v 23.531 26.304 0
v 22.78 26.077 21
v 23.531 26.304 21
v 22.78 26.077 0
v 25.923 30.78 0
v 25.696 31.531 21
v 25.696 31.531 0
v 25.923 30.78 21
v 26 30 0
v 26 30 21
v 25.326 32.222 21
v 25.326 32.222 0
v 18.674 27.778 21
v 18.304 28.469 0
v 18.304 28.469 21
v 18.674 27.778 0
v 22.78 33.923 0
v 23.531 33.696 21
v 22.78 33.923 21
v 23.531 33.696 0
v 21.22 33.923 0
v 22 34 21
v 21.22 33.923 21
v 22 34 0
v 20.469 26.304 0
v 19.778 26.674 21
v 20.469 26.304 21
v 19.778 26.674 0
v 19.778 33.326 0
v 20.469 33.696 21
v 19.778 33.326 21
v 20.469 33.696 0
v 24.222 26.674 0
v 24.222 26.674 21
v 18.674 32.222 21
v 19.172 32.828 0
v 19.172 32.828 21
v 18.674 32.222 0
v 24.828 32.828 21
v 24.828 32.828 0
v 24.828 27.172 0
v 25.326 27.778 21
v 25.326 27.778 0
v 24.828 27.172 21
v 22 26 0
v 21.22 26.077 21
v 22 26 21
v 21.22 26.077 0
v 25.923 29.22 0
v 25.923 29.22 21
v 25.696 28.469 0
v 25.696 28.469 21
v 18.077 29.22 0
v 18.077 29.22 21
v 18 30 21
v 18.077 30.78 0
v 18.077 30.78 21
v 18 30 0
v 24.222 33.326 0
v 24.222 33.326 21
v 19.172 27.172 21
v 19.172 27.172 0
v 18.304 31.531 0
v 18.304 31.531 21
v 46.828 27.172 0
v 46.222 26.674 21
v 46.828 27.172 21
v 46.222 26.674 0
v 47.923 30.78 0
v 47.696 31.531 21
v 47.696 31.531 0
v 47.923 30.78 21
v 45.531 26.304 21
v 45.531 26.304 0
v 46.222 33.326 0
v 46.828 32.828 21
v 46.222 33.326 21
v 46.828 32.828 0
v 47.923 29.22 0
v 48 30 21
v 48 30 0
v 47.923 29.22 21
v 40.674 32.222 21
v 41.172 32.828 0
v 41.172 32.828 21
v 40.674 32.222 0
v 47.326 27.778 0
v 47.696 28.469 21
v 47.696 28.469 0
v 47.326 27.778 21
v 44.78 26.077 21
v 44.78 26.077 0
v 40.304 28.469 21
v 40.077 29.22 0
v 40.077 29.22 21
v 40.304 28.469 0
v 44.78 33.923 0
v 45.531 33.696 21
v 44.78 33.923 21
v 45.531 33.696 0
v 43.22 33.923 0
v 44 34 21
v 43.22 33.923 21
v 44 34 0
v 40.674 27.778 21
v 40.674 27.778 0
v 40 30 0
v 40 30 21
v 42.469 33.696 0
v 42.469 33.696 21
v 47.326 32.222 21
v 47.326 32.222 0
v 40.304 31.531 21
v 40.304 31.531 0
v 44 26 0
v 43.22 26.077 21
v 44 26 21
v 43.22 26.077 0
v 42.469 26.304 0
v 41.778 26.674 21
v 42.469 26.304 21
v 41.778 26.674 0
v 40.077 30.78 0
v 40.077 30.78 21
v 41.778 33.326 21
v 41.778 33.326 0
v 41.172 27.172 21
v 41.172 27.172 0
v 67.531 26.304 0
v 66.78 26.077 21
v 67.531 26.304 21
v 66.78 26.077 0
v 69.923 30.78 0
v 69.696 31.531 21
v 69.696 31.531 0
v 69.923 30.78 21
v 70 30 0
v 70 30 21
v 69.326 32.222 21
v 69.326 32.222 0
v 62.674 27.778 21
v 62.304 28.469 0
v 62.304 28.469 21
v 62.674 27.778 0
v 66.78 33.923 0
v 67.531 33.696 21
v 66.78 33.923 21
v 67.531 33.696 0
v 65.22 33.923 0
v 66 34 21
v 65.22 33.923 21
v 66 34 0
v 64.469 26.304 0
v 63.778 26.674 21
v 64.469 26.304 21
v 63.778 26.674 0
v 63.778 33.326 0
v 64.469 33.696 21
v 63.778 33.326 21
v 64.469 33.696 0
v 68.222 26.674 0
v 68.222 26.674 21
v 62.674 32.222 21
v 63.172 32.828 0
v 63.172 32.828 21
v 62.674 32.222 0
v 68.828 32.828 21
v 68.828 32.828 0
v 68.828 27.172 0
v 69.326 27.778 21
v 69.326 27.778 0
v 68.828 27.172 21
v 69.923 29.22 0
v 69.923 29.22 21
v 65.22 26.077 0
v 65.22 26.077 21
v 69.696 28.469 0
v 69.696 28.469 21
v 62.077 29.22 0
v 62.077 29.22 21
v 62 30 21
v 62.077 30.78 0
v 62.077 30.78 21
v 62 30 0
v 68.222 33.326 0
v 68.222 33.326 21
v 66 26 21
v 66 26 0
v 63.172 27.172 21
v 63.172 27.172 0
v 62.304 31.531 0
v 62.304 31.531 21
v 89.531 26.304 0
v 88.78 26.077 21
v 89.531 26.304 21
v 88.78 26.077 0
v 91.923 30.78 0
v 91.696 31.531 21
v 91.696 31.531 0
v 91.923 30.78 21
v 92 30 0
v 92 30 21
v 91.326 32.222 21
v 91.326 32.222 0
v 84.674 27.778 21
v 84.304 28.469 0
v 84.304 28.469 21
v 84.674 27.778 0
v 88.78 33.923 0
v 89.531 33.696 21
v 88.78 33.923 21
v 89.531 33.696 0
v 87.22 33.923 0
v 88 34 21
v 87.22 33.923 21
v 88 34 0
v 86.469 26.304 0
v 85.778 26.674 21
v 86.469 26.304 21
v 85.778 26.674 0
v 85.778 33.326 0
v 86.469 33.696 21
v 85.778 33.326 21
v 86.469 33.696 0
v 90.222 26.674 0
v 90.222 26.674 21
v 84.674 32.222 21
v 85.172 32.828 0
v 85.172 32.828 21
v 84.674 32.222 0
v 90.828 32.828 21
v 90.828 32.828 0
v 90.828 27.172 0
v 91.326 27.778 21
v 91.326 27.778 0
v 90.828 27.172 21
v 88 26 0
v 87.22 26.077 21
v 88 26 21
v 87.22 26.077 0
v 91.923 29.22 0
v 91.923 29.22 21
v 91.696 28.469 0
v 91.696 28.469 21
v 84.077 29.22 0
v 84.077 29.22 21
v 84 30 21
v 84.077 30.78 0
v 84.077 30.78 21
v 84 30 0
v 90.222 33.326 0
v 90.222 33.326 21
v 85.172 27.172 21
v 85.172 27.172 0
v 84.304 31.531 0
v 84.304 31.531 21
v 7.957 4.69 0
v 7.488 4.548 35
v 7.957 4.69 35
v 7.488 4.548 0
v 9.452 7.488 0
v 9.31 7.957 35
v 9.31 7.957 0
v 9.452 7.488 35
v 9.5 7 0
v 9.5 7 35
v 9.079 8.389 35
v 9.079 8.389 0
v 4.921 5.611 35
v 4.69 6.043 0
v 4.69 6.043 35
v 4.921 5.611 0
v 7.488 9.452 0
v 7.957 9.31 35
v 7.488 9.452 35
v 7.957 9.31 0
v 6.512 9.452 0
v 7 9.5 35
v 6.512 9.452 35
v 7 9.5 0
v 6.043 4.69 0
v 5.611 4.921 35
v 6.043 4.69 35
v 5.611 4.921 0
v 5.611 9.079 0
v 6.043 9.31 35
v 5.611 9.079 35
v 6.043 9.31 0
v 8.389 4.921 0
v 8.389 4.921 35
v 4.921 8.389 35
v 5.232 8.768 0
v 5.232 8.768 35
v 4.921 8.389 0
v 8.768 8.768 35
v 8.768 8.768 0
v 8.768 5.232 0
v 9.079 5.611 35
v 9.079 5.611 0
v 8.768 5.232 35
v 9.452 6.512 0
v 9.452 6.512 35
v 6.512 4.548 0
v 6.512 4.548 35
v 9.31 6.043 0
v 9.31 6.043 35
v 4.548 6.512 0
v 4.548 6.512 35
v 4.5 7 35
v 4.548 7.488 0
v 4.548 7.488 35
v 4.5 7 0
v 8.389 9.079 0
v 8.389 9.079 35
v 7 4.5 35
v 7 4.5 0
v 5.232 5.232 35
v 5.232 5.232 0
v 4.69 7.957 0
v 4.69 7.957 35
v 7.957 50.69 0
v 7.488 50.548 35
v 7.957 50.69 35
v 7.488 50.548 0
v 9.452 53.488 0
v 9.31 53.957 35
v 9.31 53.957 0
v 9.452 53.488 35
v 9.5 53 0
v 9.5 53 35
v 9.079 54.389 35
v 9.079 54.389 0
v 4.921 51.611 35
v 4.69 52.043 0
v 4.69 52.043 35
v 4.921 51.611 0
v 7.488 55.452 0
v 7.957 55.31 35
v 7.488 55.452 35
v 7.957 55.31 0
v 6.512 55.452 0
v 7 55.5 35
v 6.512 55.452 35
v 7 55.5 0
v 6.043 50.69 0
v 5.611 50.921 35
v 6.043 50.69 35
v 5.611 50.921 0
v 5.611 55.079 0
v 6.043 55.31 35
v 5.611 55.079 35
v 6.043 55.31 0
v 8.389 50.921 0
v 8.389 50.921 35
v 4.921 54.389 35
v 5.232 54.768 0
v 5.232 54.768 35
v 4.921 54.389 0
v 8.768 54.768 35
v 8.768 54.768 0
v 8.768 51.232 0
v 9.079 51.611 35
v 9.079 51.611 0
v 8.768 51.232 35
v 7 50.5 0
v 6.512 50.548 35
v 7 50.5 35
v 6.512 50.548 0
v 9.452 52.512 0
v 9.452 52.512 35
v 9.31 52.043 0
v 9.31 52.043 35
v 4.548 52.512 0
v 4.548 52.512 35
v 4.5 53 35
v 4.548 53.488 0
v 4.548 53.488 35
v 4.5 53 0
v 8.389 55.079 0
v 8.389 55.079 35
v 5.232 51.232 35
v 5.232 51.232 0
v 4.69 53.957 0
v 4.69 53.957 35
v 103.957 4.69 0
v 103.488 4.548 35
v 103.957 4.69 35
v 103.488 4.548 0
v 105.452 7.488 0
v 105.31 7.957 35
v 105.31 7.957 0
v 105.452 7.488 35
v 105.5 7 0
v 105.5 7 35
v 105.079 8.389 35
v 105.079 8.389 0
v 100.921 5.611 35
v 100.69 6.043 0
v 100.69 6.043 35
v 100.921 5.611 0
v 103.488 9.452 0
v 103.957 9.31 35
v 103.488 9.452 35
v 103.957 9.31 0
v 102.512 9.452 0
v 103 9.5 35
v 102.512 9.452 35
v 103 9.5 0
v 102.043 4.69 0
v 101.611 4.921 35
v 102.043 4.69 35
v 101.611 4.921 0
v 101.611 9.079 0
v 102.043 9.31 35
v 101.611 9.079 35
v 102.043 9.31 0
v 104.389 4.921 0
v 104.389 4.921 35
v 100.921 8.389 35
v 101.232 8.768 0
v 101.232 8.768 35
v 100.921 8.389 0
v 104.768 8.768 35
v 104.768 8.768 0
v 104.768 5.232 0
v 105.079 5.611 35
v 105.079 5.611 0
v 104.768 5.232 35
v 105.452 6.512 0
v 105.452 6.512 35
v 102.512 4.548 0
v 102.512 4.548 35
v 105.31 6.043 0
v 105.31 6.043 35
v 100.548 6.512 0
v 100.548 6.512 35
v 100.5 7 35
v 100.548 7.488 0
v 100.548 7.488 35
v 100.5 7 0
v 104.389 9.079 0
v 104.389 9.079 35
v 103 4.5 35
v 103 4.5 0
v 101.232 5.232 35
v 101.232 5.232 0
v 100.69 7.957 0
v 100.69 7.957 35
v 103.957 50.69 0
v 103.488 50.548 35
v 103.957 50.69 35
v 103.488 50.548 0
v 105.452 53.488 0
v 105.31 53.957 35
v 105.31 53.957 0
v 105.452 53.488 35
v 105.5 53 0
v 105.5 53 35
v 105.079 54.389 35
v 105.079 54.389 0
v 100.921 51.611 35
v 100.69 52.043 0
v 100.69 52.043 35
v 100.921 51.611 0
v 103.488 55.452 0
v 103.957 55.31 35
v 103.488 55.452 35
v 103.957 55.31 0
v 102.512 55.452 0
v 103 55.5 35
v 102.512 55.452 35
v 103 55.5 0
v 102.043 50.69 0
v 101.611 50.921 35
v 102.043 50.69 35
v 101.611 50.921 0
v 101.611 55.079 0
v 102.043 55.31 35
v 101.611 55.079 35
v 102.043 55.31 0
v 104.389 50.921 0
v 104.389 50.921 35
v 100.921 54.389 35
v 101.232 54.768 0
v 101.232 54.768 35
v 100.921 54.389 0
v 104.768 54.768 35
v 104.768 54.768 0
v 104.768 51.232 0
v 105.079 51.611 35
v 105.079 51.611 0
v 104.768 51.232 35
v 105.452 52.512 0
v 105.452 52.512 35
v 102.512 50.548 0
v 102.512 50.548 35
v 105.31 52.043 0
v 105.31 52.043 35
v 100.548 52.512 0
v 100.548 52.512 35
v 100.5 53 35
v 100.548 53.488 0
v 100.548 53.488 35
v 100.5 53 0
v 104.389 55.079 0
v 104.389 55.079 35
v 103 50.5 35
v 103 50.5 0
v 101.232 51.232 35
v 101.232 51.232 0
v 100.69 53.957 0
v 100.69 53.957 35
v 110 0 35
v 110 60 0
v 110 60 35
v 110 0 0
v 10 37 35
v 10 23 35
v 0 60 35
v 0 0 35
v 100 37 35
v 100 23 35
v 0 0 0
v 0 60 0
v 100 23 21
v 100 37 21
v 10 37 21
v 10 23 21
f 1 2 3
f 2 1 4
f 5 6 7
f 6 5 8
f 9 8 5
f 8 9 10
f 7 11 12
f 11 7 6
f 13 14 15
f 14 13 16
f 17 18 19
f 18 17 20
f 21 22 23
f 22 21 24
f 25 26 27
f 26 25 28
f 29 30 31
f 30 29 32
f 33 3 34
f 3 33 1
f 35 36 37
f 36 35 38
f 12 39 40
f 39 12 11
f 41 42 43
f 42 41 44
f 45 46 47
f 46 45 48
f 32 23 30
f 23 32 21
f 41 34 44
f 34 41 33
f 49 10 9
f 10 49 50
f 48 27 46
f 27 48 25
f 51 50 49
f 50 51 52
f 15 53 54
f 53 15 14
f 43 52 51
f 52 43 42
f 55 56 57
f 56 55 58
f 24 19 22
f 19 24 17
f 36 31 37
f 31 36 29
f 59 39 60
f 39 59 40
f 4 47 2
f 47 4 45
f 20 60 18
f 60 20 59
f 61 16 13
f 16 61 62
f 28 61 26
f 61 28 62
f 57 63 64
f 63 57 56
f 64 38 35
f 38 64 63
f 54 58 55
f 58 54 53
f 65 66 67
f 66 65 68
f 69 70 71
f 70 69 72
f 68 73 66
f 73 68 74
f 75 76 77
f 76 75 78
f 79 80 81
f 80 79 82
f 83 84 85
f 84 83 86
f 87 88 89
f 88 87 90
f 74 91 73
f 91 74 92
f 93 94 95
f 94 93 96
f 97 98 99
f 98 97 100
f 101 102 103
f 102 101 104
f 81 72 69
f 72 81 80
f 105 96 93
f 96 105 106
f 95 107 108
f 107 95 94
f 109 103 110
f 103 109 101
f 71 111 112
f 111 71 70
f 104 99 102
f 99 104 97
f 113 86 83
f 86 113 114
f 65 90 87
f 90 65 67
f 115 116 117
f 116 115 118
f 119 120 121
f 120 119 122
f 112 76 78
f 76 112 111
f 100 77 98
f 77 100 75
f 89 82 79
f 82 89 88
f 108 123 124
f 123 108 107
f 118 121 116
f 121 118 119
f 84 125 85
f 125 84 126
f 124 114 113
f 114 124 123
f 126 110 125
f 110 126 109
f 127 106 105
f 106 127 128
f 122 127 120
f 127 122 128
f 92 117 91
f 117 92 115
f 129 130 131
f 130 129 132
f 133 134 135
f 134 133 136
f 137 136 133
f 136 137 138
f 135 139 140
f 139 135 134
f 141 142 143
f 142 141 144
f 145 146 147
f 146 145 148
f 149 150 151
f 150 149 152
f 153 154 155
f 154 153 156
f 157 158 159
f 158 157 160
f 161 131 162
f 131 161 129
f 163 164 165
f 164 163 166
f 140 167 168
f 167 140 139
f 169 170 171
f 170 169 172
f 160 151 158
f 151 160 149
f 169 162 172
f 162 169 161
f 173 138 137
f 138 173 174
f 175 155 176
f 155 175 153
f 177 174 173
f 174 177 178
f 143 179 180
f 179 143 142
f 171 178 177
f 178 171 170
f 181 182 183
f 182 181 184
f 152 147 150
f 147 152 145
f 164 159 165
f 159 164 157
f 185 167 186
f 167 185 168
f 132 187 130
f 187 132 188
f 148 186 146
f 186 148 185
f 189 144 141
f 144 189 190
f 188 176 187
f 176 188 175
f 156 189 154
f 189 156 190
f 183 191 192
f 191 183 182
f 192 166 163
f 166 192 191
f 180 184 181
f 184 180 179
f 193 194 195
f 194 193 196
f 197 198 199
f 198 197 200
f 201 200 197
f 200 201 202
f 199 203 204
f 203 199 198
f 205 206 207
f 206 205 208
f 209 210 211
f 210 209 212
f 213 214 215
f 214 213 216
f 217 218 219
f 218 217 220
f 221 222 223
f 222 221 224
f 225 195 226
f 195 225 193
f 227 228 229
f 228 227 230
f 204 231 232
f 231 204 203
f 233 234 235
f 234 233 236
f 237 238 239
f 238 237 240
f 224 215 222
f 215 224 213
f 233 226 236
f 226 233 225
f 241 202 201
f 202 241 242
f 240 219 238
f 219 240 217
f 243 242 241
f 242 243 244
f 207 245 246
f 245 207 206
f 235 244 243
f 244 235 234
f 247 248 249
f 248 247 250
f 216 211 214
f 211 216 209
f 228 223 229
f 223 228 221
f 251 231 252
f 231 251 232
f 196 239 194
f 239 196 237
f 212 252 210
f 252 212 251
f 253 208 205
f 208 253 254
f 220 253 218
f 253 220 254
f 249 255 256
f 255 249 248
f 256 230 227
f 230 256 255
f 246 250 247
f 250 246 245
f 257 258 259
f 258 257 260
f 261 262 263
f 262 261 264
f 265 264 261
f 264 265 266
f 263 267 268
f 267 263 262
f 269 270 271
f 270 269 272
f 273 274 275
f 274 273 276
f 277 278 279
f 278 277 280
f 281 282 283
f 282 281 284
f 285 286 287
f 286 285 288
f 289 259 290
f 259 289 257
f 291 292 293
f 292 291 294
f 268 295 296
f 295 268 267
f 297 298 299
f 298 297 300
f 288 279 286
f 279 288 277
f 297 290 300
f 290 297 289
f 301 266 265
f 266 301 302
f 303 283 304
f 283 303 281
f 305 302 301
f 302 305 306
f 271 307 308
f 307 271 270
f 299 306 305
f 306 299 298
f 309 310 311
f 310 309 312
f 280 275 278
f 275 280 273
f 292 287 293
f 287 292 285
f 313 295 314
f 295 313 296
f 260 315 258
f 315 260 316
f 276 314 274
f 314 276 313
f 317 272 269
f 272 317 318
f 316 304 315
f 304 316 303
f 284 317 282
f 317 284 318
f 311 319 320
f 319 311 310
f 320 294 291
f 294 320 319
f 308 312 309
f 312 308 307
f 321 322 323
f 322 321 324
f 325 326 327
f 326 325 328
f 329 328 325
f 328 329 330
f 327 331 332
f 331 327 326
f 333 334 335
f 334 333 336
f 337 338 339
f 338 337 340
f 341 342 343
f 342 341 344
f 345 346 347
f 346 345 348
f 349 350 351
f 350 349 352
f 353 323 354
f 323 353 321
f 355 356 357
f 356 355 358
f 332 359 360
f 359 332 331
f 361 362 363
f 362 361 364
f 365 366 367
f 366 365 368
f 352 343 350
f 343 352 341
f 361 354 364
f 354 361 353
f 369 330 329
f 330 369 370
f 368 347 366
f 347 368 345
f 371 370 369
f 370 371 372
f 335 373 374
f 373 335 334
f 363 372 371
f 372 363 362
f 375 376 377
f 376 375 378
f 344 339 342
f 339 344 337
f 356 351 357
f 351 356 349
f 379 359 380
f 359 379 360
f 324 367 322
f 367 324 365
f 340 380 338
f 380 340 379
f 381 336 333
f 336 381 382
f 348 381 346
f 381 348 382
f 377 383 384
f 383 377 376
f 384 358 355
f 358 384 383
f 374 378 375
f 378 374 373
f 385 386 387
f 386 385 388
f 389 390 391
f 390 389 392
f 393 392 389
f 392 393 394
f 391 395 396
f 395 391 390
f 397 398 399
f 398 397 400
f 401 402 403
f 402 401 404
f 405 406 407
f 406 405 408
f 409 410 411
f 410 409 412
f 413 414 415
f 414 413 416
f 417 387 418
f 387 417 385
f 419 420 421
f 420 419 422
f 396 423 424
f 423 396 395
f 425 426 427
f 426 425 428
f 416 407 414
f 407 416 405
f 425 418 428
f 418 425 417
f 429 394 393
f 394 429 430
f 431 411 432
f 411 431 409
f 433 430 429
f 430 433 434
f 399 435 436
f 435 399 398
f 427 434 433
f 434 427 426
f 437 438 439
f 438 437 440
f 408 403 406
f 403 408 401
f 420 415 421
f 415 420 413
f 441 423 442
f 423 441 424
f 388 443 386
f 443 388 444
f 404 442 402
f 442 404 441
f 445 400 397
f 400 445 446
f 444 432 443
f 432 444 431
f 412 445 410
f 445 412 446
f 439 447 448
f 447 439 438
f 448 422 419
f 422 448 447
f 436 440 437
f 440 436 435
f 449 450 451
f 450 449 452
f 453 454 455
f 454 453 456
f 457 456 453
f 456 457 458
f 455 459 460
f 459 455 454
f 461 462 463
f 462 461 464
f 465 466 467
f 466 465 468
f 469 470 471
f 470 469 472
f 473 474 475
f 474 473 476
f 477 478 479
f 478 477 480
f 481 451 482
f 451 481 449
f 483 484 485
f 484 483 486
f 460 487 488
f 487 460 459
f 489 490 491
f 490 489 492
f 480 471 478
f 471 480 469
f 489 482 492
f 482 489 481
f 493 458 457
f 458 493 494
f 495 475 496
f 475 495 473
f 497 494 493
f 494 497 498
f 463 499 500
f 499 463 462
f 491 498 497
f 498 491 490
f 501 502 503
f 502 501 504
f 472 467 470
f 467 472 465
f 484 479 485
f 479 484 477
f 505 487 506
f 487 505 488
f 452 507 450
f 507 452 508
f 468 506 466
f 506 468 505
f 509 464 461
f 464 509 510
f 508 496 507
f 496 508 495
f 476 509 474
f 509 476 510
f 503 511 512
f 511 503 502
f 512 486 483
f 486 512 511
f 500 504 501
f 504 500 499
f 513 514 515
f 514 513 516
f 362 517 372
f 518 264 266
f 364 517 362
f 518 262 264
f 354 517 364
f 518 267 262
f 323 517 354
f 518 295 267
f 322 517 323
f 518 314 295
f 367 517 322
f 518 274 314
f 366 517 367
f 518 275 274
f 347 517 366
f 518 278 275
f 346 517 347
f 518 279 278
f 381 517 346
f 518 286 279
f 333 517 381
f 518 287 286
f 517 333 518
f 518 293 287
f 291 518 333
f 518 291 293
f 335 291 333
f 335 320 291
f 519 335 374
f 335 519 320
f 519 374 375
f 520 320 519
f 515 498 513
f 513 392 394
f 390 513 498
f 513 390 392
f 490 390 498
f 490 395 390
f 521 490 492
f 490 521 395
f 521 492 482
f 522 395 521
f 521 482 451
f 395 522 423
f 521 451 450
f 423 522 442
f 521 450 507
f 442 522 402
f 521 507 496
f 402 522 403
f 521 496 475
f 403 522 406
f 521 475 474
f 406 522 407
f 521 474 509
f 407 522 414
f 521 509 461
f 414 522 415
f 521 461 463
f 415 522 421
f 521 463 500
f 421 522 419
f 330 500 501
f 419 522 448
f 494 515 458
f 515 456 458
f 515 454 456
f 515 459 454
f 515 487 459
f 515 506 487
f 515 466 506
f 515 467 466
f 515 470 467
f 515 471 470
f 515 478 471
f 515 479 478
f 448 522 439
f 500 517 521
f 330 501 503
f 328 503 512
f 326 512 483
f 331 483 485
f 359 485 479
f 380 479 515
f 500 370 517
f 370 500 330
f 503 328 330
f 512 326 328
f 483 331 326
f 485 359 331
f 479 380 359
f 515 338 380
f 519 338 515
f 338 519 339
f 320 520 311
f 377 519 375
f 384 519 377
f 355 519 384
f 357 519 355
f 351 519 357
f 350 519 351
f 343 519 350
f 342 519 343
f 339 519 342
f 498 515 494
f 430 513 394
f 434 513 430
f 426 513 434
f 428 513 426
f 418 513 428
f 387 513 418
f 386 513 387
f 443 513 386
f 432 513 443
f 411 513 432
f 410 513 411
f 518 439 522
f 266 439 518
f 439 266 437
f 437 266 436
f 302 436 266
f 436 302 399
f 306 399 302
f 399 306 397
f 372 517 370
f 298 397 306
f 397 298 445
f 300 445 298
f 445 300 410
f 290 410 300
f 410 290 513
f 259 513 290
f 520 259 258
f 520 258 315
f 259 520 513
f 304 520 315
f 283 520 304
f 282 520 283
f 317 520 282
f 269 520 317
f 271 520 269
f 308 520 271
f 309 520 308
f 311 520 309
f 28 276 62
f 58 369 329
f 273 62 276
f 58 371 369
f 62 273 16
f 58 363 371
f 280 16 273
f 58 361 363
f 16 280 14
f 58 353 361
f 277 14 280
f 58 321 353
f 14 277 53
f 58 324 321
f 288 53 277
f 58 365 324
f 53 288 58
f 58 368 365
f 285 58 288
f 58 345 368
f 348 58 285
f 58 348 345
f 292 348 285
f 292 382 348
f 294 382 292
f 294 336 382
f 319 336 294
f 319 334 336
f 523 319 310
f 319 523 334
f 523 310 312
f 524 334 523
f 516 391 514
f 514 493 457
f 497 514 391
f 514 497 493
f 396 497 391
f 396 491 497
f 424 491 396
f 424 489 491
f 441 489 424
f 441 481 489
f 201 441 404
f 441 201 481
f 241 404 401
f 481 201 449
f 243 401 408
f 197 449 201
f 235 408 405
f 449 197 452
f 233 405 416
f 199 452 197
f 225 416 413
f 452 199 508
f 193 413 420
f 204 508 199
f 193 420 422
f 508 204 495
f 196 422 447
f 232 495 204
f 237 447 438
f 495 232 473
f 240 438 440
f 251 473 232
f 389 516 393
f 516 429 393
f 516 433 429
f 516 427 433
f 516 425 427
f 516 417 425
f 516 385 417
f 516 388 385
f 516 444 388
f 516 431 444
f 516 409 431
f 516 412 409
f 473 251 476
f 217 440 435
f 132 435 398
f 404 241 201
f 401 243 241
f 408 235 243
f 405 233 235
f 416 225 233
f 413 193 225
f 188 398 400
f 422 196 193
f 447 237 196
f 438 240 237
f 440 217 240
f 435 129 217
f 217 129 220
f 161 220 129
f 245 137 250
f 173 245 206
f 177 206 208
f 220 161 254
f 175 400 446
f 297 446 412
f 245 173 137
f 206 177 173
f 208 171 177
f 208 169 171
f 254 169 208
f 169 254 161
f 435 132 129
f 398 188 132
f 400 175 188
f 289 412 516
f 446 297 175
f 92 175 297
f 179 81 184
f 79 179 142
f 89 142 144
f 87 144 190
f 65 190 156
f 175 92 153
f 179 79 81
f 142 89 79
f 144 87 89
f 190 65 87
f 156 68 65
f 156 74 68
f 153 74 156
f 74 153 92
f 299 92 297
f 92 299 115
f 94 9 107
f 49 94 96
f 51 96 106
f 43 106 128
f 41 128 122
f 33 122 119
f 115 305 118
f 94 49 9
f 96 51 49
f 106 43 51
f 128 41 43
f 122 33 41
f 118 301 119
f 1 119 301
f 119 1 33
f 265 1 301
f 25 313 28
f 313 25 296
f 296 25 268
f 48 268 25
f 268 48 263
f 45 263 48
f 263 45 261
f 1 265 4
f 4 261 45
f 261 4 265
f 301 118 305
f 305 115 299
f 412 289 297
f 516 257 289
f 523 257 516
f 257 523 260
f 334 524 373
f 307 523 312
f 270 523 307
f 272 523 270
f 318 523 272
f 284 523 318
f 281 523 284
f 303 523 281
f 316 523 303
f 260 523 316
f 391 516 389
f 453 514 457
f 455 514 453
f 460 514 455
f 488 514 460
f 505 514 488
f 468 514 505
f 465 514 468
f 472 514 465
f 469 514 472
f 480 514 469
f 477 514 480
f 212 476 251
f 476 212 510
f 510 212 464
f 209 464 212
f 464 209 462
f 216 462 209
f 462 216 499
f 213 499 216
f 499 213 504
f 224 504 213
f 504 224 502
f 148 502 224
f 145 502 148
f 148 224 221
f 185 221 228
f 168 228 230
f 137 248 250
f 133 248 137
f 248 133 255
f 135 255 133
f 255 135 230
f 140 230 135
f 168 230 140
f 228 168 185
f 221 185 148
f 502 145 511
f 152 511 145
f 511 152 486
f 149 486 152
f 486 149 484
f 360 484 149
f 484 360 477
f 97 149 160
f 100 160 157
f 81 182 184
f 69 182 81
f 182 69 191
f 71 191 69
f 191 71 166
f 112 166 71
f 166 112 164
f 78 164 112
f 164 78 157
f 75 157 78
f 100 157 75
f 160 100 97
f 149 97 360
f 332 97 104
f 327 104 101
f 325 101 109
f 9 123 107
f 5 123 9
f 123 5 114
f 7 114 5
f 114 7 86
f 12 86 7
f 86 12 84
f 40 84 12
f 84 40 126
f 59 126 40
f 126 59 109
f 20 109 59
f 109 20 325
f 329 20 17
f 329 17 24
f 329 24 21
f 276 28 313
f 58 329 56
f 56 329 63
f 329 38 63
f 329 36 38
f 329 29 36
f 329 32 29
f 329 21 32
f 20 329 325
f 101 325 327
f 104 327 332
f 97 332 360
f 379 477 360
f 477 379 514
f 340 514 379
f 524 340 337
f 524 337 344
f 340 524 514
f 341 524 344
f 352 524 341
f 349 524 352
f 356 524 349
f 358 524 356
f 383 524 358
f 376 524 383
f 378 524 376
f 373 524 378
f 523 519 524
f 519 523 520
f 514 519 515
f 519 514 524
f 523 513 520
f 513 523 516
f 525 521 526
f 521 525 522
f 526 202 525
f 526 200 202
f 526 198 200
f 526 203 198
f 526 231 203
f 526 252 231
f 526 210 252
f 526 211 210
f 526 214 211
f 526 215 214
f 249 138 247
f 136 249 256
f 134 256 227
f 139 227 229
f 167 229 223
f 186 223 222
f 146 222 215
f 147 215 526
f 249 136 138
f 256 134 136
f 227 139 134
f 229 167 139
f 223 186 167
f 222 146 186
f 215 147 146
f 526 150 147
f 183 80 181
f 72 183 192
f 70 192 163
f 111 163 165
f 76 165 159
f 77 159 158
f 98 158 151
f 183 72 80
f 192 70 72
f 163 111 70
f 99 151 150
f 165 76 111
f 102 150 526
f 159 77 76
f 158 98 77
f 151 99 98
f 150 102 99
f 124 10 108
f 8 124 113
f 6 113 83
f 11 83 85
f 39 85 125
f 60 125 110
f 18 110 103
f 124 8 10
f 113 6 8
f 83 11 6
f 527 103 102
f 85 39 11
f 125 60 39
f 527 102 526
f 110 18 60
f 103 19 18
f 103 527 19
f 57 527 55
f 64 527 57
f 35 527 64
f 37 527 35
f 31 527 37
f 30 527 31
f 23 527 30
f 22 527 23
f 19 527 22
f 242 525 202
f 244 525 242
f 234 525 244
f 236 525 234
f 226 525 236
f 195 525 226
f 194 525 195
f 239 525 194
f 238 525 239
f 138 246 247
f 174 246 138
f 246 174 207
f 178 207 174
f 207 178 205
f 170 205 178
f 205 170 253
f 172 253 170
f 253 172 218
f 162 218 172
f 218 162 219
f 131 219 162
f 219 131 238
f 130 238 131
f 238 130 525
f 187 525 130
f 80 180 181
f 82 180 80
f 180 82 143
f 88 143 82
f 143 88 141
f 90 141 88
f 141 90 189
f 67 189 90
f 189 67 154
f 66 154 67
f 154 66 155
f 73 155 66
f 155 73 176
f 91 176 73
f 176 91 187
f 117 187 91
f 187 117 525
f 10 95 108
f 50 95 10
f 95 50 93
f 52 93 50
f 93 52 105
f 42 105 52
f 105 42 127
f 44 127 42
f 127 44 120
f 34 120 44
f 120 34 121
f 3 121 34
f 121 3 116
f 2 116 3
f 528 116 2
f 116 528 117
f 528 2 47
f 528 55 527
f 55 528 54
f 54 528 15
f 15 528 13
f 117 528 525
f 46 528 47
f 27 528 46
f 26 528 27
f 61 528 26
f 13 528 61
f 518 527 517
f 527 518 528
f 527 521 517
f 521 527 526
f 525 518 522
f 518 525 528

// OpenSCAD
$fn = 32;

// ----------------------------------------------------------------------
// Manifold block: gallery_top manifold
// ----------------------------------------------------------------------

// --- parameters (mm) ---
block_l = 110;            // block length, X
block_w = 60;             // block width, Y
block_h = 35;             // block height, Z
port_d = 8;               // port bore diameter
port_pitch = 22;          // port pitch along X
gallery_d = 14;           // top gallery width, Y
gallery_depth = 14;       // gallery pocket depth
wall_p = 10;              // gallery end wall thickness, X
mnt_d = 5;                // mounting hole diameter
mnt_in = 7;               // mounting hole inset from the edges
fit_tol = 0.05;           // tolerance for press fits, mm
free_tol = 0.2;           // tolerance for clearance fits, mm

n_ports = 4;  // ports in the row
port_x0 = (block_l - (n_ports - 1) * port_pitch) / 2;  // first port X

difference() {
  cube([block_l, block_w, block_h]);
  for (i = [0 : n_ports - 1])
    translate([port_x0 + i * port_pitch, block_w / 2, -1])
      cylinder(h = block_h + 2, d = port_d);
  translate([wall_p, block_w / 2 - gallery_d / 2, block_h - gallery_depth])
    cube([block_l - 2 * wall_p, gallery_d, gallery_depth + 1]);
  for (cx = [mnt_in, block_l - mnt_in])
    for (cy = [mnt_in, block_w - mnt_in])
      translate([cx, cy, -1]) cylinder(h = block_h + 2, d = mnt_d);
}
